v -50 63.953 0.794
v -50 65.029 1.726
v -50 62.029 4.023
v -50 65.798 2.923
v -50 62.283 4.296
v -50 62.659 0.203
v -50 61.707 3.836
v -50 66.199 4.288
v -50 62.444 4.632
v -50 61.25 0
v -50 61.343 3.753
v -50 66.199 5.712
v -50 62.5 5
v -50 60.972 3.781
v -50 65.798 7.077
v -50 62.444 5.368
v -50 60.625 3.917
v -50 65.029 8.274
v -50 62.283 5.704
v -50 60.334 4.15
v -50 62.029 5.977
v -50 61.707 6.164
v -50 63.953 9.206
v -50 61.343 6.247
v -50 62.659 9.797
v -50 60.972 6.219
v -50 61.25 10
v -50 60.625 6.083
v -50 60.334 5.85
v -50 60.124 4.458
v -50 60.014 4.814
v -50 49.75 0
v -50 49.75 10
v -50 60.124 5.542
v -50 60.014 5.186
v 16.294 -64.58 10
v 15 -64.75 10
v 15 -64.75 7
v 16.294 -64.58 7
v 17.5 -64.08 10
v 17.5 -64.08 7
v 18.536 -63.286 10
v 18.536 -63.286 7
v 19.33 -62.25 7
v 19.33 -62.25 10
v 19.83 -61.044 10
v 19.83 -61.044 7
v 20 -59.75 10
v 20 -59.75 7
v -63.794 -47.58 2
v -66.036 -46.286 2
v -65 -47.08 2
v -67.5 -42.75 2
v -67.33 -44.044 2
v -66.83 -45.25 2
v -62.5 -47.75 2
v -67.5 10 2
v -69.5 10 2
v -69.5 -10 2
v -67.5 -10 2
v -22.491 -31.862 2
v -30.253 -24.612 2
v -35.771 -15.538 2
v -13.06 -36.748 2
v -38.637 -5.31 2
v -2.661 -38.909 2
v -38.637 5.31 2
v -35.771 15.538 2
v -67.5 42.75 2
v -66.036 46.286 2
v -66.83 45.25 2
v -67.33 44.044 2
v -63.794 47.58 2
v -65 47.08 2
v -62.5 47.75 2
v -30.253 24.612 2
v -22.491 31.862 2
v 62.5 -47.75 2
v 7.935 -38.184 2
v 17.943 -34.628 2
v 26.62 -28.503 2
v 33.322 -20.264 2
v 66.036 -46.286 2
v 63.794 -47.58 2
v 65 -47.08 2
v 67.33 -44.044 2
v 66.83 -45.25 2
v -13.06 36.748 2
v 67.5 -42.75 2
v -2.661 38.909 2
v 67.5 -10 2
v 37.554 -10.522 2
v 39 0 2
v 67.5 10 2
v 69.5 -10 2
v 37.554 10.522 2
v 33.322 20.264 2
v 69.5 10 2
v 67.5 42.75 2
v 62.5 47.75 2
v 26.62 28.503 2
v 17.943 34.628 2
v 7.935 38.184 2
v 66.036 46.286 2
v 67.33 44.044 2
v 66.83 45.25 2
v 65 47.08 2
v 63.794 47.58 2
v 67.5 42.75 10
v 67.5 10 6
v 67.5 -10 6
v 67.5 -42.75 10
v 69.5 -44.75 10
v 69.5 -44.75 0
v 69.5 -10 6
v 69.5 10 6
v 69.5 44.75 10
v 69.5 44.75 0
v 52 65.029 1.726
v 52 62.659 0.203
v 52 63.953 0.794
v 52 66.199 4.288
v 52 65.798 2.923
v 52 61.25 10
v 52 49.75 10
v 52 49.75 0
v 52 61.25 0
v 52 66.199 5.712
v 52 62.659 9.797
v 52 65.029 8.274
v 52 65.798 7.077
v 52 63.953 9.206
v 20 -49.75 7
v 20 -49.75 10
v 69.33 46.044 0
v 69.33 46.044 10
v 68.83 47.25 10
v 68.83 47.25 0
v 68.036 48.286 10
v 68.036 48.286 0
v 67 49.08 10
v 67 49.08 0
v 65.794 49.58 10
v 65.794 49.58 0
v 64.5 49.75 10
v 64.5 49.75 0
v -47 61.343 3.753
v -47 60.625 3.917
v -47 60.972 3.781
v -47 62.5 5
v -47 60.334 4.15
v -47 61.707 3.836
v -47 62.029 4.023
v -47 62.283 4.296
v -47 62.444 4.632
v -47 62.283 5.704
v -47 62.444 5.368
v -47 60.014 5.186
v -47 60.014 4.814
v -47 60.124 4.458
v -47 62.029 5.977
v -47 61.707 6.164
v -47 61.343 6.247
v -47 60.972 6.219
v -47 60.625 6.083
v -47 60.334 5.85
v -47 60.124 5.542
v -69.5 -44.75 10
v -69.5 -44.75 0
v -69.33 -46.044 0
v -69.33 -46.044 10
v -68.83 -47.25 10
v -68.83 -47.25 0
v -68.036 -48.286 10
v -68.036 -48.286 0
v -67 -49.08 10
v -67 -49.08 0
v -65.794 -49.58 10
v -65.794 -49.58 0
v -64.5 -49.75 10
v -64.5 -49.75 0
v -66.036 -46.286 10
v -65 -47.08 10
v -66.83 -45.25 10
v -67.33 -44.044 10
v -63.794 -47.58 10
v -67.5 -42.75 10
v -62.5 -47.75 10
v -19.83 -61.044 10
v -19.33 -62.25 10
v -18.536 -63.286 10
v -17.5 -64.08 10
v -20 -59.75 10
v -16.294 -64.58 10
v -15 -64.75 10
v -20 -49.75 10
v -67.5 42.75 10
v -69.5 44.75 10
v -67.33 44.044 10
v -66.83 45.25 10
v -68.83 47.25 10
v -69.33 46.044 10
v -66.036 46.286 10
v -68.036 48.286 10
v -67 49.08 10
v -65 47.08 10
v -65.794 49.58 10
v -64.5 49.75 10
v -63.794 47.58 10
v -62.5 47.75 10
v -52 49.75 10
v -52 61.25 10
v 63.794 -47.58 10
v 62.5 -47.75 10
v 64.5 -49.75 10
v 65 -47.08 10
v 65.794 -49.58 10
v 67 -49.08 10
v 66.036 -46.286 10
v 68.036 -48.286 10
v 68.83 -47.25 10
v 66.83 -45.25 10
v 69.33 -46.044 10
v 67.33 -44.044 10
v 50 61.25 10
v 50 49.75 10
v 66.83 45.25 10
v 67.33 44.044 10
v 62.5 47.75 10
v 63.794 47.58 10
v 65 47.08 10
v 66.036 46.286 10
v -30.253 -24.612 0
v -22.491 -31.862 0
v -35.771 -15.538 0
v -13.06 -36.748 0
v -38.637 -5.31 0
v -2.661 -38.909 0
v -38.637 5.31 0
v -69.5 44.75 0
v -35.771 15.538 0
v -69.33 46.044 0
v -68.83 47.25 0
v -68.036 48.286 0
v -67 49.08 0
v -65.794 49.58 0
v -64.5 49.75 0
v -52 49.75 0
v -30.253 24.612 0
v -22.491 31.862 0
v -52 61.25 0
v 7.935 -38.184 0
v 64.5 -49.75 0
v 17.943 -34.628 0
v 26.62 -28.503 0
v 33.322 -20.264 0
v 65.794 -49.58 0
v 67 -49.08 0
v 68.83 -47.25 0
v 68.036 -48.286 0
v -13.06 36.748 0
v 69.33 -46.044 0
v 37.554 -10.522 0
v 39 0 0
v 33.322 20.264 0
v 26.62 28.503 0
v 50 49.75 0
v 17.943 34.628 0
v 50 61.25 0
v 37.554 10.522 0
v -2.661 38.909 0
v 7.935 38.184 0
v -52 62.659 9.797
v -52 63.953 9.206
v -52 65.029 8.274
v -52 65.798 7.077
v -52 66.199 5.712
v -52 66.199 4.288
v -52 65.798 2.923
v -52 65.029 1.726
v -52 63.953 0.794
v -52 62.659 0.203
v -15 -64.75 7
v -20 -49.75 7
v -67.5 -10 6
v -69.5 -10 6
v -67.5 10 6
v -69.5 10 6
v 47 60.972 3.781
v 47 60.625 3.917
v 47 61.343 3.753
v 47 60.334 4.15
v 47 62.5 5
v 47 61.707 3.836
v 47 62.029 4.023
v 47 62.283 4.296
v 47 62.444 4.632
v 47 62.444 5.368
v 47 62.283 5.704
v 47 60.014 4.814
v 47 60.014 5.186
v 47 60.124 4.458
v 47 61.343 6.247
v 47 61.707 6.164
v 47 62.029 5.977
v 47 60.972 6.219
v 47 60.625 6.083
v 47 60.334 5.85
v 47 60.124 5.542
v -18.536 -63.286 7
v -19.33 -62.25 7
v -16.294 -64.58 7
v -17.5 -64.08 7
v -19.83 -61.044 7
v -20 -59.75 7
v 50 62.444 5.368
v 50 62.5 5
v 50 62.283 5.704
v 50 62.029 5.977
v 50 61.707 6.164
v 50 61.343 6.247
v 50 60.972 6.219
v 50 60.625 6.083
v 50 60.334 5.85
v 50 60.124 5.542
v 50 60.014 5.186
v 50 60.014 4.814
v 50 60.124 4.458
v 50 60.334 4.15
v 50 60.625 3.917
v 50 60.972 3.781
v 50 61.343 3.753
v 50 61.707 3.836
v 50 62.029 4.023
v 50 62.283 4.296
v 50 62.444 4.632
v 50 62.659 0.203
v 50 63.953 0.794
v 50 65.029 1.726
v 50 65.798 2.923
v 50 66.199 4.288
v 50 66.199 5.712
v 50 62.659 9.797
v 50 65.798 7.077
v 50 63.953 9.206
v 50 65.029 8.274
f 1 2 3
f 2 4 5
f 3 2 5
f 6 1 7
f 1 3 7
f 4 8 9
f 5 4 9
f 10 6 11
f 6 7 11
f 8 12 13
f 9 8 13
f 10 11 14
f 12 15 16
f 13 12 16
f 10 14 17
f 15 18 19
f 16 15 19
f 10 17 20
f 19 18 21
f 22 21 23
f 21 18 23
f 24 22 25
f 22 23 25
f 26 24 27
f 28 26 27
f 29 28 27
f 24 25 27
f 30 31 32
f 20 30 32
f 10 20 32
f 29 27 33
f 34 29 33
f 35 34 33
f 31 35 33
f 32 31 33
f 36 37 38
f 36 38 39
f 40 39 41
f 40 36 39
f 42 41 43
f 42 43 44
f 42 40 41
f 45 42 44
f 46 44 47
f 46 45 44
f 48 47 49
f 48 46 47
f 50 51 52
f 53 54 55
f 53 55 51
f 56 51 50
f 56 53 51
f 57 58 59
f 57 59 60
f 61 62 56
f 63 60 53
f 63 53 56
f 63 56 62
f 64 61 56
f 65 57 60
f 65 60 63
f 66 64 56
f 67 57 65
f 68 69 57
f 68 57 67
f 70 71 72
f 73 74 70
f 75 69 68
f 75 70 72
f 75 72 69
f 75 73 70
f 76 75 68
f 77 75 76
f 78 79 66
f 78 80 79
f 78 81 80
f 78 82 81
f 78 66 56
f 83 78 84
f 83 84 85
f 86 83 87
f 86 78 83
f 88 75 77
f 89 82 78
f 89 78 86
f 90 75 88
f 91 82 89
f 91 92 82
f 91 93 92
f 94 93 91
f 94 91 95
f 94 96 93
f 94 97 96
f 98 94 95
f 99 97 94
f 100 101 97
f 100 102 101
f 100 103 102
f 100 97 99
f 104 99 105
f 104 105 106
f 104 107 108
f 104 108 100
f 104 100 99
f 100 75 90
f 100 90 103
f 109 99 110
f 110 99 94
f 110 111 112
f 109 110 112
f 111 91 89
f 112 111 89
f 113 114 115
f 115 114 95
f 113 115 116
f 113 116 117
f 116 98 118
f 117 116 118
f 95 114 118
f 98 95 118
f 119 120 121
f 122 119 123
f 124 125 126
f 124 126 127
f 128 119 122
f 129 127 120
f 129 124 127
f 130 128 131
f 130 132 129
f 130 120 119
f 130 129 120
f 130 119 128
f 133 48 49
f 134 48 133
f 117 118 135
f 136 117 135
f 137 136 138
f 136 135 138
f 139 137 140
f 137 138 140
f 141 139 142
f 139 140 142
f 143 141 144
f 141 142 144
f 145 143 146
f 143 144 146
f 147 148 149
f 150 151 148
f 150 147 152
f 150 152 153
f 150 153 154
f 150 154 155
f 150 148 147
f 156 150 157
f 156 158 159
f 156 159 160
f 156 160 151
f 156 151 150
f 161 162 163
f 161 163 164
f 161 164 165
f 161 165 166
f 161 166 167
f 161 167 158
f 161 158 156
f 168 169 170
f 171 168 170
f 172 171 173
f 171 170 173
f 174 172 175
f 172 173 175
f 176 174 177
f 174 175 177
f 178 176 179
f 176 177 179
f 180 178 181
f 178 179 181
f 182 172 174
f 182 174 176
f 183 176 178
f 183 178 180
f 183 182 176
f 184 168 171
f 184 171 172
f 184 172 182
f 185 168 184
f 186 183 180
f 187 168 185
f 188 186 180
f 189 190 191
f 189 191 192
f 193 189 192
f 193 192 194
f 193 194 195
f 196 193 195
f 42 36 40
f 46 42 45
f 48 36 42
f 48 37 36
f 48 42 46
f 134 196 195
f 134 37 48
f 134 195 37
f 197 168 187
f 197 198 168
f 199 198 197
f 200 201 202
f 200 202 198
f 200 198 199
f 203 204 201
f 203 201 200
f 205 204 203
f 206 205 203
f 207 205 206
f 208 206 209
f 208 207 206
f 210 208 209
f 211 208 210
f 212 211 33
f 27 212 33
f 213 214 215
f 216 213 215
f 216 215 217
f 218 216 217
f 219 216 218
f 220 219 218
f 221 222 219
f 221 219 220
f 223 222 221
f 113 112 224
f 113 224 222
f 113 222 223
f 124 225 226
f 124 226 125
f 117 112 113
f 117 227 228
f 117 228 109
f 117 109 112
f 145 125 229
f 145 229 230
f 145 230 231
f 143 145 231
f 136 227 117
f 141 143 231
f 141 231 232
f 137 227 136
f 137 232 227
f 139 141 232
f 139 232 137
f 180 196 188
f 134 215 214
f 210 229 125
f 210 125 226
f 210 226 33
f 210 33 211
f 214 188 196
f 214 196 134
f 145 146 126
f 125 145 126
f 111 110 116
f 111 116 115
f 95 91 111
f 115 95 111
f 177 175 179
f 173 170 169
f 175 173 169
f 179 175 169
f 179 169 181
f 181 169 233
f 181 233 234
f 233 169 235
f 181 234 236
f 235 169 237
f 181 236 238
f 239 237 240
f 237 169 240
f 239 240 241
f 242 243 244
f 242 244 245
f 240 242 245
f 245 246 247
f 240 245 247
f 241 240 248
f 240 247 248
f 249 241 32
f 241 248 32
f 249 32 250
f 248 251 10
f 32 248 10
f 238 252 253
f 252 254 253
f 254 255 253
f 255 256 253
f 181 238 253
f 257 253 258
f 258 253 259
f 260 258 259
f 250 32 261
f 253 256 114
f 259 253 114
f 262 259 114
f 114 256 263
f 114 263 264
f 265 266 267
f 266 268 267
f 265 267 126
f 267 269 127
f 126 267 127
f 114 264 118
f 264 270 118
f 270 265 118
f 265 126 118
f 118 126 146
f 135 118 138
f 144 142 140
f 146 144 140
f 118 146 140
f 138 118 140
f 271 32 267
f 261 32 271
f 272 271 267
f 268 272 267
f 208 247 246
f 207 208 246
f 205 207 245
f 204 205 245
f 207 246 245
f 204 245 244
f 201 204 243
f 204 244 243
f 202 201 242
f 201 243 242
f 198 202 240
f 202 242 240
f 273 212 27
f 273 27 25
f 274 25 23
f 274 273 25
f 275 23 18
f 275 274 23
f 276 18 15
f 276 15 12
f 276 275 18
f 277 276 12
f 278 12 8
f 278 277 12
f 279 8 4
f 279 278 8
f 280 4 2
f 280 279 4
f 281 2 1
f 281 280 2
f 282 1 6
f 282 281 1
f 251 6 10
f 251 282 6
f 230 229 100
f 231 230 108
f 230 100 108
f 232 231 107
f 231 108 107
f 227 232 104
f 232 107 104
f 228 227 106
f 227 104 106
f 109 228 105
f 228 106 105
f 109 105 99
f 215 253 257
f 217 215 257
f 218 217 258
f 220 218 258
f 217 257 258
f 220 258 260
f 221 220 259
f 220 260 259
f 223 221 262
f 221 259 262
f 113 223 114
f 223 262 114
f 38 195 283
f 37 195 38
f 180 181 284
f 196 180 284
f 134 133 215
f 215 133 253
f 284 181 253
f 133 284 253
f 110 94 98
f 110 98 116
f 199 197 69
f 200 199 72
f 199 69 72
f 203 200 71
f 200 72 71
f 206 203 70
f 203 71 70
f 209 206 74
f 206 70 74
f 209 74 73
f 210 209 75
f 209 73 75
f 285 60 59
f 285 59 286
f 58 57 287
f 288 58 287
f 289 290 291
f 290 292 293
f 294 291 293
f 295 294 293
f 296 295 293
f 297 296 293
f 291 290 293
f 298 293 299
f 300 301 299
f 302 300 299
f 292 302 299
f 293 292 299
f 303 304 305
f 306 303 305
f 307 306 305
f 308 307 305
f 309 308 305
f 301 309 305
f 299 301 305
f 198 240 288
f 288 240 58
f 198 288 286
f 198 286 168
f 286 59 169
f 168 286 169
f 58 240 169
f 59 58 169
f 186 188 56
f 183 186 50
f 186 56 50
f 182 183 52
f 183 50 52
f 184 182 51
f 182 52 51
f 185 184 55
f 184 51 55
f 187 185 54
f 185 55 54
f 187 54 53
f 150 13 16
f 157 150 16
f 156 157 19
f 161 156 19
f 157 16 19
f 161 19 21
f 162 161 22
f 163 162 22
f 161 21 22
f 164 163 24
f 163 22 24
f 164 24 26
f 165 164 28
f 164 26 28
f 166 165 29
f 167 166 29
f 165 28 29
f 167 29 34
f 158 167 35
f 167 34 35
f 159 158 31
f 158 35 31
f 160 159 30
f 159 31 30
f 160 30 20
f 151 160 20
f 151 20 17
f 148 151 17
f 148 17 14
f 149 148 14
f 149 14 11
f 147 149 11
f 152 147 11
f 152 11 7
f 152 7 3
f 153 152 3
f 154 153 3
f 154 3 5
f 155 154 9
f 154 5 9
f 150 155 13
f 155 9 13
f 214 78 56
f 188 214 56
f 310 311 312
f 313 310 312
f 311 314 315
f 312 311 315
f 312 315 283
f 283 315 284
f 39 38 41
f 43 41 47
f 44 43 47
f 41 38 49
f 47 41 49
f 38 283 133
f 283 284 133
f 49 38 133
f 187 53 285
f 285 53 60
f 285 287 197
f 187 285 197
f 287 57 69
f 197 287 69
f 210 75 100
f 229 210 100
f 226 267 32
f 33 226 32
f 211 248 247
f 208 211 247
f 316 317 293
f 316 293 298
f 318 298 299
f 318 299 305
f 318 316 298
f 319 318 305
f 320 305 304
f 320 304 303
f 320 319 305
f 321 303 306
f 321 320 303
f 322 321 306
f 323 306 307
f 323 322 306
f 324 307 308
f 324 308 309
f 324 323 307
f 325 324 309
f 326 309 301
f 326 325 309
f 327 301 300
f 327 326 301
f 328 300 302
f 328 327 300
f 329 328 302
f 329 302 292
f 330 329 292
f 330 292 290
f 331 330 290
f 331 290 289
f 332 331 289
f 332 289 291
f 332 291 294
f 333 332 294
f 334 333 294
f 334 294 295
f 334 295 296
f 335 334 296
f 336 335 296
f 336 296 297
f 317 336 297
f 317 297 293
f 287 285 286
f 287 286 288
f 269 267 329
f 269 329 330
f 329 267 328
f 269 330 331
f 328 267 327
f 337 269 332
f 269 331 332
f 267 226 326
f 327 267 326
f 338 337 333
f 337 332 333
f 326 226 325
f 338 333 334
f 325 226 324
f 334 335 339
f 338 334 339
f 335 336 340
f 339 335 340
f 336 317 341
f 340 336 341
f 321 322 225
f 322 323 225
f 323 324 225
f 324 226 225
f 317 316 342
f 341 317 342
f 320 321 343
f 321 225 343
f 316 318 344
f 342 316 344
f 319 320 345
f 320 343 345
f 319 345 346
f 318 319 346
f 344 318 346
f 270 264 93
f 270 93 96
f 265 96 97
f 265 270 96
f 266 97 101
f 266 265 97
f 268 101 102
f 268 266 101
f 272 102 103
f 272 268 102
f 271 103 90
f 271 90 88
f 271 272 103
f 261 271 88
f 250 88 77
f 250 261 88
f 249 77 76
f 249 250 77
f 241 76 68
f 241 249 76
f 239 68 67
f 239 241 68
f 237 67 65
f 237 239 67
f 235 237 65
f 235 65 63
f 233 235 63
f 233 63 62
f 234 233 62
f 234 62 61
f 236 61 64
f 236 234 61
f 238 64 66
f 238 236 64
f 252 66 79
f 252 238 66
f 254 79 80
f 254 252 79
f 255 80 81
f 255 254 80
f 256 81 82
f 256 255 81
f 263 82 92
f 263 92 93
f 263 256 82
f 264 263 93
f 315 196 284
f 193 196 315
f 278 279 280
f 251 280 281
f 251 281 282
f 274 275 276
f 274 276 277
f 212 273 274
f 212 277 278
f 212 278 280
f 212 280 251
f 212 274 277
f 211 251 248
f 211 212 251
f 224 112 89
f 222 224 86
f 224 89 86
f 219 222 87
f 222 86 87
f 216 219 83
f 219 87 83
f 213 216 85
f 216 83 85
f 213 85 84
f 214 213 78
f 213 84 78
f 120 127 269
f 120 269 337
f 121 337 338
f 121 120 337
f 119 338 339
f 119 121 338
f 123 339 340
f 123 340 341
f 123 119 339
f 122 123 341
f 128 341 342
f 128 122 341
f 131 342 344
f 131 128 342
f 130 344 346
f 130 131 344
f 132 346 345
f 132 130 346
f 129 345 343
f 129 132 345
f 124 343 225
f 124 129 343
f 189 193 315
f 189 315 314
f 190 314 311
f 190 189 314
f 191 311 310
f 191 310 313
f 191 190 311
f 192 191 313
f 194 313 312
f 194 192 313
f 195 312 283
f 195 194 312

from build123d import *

# Parameters (mm, degrees)
F1_DEPTH  = 10
F0_R      = 39
F2_DEPTH  = 2
F4_DEPTH  = 3
F5_W      = 20
F5_H      = 4
F6_DEPTH  = 2
F7_W      = 20
F7_H      = 4
F8_DEPTH  = 2
F9_W      = 2
F9_H      = 10
F10_DEPTH = 11.5
F12_DEPTH = 2
F13_R     = 1.25
F14_DEPTH = 3
F16_R     = 1.25
F17_DEPTH = 2
F18_DEPTH = 5


# Not quite as in the source:
# - a feature names something its author has since deleted; it is built from what else it names


with BuildPart() as f1:
    # F0 (on Top) → F1 (new body)
    with BuildSketch(Plane.XY):
        with BuildLine():
            ThreePointArc((69.5, 44.75), (68.0355339059, 48.2855339059), (64.5, 49.75))
            Line((64.5, 49.75), (-64.5, 49.75))
            ThreePointArc((-64.5, 49.75), (-68.0355339059, 48.2855339059), (-69.5, 44.75))
            Line((-69.5, 44.75), (-69.5, -44.75))
            ThreePointArc((-69.5, -44.75), (-68.0355339059, -48.2855339059), (-64.5, -49.75))
            Line((-64.5, -49.75), (64.5, -49.75))
            ThreePointArc((64.5, -49.75), (68.0355339059, -48.2855339059), (69.5, -44.75))
            Line((69.5, -44.75), (69.5, 44.75))
        make_face()
        with BuildLine():
            Line((-62.5, 47.75), (62.5, 47.75))
            ThreePointArc((62.5, 47.75), (66.0355339059, 46.2855339059), (67.5, 42.75))
            Line((67.5, 42.75), (67.5, -42.75))
            ThreePointArc((67.5, -42.75), (66.0355339059, -46.2855339059), (62.5, -47.75))
            Line((62.5, -47.75), (-62.5, -47.75))
            ThreePointArc((-62.5, -47.75), (-66.0355339059, -46.2855339059), (-67.5, -42.75))
            Line((-67.5, -42.75), (-67.5, 42.75))
            ThreePointArc((-67.5, 42.75), (-66.0355339059, 46.2855339059), (-62.5, 47.75))
        make_face(mode=Mode.SUBTRACT)
    extrude(amount=F1_DEPTH)

    # F0 (on Top) → F2 (join)
    with BuildSketch(Plane.XY):
        with BuildLine():
            ThreePointArc((67.5, 42.75), (66.0355339059, 46.2855339059), (62.5, 47.75))
            Line((62.5, 47.75), (-62.5, 47.75))
            ThreePointArc((-62.5, 47.75), (-66.0355339059, 46.2855339059), (-67.5, 42.75))
            Line((-67.5, 42.75), (-67.5, -42.75))
            ThreePointArc((-67.5, -42.75), (-66.0355339059, -46.2855339059), (-62.5, -47.75))
            Line((-62.5, -47.75), (62.5, -47.75))
            ThreePointArc((62.5, -47.75), (66.0355339059, -46.2855339059), (67.5, -42.75))
            Line((67.5, -42.75), (67.5, 42.75))
        make_face()
        Circle(F0_R, mode=Mode.SUBTRACT)
    extrude(amount=F2_DEPTH)

    # F3 (on face) → F4 (join)
    with BuildSketch(Plane.XY.offset(10)):
        with BuildLine():
            Line((20, -49.75), (-20, -49.75))
            Line((-20, -49.75), (-20, -59.75))
            ThreePointArc((-20, -59.75), (-18.5355339059, -63.2855339059), (-15, -64.75))
            Line((-15, -64.75), (15, -64.75))
            ThreePointArc((15, -64.75), (18.5355339059, -63.2855339059), (20, -59.75))
            Line((20, -59.75), (20, -49.75))
        make_face()
    extrude(amount=-F4_DEPTH)

    # F5 (on face) → F6 (cut, through all)
    with BuildSketch(Plane.YZ.offset(-67.5)):
        with Locations((0, 4)):
            Rectangle(F5_W, F5_H)
    extrude(amount=-F6_DEPTH, mode=Mode.SUBTRACT)

    # F7 (on face) → F8 (cut, through all)
    with BuildSketch(Plane(origin=(67.5, 0, 0), x_dir=(0, -1, 0), z_dir=(-1, 0, 0))):
        with Locations((0, 4)):
            Rectangle(F7_W, F7_H)
    extrude(amount=-F8_DEPTH, mode=Mode.SUBTRACT)

    # F9 (on face) → F10 (join)
    with BuildSketch(Plane(origin=(0, 49.75, 0), x_dir=(-1, 0, 0), z_dir=(0, 1, 0))):
        with Locations((51, 5)):
            Rectangle(F9_W, F9_H)
    extrude(amount=F10_DEPTH)

    # F11 (on face) → F12 (join)
    with BuildSketch(Plane(origin=(-52, 0, 0), x_dir=(0, -1, 0), z_dir=(-1, 0, 0))):
        with BuildLine():
            Line((-61.25, 0), (-61.25, 10))
            ThreePointArc((-61.25, 10), (-66.25, 5), (-61.25, 0))
        make_face()
    extrude(amount=-F12_DEPTH)

    # F13 (on face) → F14 (join)
    with BuildSketch(Plane.YZ.offset(-50)):
        with Locations((61.25, 5)):
            Circle(F13_R)
    extrude(amount=F14_DEPTH)

    # F16 (on offset) → F17 (join)
    with BuildSketch(Plane.YZ.offset(52)):
        with BuildLine():
            Line((61.25, 10), (49.75, 10))
            Line((49.75, 10), (49.75, 0))
            Line((49.75, 0), (61.25, 0))
            ThreePointArc((61.25, 0), (66.25, 5), (61.25, 10))
        make_face()
        with Locations((61.25, 5)):
            Circle(F16_R, mode=Mode.SUBTRACT)
    extrude(amount=-F17_DEPTH)

    # F16 (on offset) → F18 (join)
    with BuildSketch(Plane.YZ.offset(52)):
        with Locations((61.25, 5)):
            Circle(F16_R)
    extrude(amount=-F18_DEPTH)


solid = f1.part
